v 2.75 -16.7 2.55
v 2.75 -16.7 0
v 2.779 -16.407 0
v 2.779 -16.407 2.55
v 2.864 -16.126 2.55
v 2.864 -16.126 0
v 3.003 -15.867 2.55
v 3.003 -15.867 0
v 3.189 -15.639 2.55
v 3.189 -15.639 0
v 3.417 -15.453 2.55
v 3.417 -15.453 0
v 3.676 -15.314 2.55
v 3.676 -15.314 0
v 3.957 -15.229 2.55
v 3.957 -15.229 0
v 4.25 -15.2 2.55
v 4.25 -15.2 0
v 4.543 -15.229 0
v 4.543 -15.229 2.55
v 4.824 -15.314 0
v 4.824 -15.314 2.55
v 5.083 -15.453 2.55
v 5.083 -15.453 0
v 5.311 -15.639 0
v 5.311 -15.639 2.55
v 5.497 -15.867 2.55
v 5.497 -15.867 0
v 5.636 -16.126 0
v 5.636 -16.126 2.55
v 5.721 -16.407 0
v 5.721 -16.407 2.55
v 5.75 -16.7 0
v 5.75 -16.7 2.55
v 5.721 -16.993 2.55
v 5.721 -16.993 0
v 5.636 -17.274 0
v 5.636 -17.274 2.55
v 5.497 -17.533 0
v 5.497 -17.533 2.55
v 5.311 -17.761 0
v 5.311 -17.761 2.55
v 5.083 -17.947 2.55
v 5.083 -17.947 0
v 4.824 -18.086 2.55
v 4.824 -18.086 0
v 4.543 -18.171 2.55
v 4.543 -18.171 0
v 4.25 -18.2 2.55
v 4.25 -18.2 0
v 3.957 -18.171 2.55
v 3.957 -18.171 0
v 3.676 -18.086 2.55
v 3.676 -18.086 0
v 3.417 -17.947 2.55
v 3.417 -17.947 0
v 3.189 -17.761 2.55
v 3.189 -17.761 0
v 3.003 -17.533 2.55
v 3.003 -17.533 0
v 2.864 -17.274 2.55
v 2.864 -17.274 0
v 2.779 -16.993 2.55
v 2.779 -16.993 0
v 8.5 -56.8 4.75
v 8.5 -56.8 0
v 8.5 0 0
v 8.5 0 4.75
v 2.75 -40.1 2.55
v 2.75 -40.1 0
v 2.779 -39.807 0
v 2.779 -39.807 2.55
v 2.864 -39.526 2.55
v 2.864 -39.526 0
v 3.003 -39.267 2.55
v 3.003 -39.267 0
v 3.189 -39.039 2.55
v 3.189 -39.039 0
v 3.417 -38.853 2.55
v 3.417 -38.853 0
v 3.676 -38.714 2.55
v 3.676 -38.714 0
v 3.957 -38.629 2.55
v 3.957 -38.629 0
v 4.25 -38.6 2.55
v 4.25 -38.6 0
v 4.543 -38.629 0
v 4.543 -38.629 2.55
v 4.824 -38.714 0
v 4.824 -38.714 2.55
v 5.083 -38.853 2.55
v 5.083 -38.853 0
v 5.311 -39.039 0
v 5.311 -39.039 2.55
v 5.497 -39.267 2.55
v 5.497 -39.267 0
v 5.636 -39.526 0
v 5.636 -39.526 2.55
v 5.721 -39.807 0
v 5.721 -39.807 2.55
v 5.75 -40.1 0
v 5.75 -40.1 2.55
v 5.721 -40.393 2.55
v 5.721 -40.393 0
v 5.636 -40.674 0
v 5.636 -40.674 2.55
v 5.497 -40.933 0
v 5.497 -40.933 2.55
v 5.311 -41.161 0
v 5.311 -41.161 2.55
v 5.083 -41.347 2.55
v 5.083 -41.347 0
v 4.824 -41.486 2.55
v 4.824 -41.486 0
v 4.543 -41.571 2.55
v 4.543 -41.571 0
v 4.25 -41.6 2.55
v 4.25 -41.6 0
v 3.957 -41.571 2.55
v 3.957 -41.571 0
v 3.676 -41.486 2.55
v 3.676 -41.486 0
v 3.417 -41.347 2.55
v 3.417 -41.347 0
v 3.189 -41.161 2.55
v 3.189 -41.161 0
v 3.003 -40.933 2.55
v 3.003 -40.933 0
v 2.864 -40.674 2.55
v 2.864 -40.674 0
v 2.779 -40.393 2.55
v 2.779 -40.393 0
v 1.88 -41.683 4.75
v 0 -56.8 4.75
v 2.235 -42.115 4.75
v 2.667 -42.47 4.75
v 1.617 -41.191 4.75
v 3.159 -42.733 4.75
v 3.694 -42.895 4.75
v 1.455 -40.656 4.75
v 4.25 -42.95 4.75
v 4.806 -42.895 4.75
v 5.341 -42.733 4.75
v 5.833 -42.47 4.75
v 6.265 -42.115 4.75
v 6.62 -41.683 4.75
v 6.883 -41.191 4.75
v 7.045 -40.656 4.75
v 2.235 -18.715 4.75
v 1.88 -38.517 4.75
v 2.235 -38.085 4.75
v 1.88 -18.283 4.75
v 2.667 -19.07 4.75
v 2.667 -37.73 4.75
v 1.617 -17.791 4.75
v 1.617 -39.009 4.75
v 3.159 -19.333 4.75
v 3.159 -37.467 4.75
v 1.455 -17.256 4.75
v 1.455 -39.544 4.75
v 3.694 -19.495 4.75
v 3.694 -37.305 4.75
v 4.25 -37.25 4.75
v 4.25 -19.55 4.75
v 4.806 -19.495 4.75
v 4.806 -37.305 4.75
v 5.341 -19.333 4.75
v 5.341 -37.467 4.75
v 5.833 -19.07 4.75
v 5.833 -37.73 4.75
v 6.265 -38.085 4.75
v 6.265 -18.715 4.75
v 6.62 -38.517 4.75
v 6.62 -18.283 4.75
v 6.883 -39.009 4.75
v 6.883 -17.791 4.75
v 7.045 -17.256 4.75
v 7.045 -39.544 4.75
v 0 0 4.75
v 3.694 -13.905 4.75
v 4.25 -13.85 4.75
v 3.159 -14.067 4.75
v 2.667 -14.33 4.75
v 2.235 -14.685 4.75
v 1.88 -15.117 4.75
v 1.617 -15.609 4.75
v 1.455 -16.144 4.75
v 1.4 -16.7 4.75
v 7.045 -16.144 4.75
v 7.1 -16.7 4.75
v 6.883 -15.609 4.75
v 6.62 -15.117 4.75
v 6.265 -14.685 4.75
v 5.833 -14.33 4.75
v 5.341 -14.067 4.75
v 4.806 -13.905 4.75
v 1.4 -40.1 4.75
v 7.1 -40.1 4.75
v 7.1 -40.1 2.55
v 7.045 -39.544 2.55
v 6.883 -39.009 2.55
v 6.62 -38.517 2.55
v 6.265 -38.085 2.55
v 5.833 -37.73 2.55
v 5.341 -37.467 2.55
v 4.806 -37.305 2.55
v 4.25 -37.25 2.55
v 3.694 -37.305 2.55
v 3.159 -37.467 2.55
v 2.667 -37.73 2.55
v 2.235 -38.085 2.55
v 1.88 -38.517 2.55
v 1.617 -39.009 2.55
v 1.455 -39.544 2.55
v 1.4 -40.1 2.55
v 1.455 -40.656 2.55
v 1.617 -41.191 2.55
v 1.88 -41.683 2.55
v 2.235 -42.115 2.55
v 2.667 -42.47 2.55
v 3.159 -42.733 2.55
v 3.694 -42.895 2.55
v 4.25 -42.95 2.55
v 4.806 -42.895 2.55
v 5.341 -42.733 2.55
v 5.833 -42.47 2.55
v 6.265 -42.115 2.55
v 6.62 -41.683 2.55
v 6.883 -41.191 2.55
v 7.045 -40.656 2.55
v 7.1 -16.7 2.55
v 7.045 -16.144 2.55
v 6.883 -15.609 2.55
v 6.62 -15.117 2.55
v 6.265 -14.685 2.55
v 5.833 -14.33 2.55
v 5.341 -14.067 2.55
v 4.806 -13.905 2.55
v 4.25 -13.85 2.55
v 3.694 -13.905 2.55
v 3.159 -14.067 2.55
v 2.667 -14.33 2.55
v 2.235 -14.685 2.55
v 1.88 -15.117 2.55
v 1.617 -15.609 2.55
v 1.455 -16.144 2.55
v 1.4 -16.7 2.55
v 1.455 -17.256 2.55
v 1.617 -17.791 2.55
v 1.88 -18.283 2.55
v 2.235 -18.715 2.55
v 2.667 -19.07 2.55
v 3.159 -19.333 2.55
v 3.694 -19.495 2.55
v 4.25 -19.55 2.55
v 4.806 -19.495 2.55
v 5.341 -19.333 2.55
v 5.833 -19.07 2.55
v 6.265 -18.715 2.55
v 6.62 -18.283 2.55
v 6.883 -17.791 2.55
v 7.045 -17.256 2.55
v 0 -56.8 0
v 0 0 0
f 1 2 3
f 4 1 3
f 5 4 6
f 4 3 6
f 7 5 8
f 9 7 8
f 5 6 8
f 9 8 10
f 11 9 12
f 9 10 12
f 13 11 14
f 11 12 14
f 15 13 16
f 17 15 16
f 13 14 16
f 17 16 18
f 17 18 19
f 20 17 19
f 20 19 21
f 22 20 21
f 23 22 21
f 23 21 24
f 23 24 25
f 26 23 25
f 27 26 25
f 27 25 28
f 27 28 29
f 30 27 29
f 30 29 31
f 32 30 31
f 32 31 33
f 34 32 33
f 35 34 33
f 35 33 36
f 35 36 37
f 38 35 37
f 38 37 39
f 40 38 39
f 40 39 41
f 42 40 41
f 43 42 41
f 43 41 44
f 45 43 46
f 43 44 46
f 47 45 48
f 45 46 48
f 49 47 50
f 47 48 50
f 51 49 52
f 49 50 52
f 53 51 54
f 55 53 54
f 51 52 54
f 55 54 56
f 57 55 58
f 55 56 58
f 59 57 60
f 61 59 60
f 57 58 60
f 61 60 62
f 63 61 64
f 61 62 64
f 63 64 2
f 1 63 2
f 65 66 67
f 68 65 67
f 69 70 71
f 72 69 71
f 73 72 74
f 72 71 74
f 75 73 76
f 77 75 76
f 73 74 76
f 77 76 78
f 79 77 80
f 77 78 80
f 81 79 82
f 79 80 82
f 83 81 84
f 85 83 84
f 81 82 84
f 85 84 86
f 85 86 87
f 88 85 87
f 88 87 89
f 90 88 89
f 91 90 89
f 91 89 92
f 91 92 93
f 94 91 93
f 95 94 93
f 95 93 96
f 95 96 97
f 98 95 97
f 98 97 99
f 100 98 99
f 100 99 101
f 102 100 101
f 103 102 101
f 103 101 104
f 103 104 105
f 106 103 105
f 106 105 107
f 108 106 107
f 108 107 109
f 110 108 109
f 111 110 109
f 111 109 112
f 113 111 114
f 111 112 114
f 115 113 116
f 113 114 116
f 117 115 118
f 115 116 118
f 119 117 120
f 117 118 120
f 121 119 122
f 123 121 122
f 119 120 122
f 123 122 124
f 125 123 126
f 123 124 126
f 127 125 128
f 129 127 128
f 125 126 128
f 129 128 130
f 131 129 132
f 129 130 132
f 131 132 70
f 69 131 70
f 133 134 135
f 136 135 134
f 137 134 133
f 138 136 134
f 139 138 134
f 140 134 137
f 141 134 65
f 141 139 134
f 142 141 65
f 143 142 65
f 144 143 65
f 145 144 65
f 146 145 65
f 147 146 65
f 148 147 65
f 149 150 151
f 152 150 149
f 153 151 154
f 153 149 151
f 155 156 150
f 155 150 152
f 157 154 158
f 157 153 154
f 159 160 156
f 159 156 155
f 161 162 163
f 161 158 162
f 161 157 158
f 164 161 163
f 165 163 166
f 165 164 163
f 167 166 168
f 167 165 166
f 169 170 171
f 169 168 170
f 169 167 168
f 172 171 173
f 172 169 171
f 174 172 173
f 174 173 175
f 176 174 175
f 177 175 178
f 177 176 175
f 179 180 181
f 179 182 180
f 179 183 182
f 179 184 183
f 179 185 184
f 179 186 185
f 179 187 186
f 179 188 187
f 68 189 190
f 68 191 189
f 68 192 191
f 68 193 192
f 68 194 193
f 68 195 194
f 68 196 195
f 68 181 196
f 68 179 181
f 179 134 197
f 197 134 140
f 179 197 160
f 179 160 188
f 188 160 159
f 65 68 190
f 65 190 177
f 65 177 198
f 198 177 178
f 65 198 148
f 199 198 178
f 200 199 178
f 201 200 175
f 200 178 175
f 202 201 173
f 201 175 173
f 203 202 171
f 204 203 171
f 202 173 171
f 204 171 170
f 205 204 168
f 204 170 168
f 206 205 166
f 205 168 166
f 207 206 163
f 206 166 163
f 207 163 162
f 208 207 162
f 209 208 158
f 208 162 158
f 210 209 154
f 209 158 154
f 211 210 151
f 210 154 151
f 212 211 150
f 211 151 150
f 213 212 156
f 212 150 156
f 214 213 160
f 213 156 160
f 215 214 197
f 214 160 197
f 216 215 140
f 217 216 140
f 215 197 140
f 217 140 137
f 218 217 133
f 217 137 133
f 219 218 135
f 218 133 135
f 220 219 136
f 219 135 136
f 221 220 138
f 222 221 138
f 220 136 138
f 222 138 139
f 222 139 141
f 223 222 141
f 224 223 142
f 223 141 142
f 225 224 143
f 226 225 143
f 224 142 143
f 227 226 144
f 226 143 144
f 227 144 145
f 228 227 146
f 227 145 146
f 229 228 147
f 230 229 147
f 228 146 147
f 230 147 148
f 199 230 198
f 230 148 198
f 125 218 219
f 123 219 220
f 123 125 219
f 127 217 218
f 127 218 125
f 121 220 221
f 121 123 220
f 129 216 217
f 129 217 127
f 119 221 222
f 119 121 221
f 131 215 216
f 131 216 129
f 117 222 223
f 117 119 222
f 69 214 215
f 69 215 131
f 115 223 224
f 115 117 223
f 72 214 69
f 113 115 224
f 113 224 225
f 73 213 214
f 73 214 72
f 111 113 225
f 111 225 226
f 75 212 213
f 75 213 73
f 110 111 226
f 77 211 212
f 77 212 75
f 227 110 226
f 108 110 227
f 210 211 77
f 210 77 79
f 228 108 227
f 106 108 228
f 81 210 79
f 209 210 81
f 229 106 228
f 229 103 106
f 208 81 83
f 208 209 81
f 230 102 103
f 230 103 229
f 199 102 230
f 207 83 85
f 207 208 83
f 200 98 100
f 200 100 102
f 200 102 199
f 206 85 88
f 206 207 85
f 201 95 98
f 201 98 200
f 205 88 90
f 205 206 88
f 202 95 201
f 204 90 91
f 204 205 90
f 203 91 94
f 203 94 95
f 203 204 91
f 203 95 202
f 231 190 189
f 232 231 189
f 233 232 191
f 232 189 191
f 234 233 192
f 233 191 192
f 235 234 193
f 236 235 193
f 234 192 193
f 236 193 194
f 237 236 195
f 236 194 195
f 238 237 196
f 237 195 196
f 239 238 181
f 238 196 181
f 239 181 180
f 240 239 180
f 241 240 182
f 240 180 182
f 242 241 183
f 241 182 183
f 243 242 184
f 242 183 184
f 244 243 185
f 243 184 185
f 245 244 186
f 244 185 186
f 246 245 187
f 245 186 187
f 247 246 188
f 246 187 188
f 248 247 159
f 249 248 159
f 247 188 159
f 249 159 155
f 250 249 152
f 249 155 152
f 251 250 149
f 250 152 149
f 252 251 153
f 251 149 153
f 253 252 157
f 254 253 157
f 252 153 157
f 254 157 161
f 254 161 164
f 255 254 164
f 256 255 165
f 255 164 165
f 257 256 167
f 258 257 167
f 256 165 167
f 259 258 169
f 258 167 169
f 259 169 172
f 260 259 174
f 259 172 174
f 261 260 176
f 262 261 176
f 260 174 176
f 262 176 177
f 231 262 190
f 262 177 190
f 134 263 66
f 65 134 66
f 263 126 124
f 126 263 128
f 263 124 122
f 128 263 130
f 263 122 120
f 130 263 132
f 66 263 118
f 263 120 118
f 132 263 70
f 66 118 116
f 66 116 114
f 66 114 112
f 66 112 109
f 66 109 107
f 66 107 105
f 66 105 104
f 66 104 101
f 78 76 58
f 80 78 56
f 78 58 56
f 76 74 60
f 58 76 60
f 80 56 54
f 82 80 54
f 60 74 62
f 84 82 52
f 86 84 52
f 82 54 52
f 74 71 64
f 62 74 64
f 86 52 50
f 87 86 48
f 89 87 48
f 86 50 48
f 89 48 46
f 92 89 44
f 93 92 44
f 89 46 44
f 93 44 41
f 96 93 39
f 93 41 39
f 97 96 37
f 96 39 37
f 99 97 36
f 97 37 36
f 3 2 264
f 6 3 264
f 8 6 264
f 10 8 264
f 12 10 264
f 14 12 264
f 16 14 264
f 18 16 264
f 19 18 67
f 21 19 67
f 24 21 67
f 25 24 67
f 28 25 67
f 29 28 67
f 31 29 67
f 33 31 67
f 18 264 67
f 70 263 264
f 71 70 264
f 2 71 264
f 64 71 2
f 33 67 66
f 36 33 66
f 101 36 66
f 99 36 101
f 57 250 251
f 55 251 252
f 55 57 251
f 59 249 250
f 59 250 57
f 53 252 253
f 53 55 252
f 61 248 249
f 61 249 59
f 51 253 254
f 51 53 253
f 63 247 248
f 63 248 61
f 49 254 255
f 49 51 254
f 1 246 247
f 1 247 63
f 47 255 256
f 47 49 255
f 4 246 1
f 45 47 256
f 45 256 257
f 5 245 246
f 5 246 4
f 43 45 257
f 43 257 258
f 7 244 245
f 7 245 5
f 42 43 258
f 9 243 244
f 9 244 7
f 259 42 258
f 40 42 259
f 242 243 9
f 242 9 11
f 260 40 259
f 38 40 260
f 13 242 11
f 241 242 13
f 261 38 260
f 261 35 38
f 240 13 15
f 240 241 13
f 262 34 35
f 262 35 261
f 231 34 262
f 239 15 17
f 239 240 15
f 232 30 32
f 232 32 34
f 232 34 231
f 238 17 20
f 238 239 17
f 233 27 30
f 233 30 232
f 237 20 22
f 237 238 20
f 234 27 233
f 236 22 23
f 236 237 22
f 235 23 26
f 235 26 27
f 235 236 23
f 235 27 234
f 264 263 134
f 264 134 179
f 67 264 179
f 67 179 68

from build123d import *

# Parameters (mm, degrees)
SKETCH1_W                 = 8.5
SKETCH1_H                 = 56.8
BOSS_EXTRUDE1_DEPTH       = 4.75
F_3_0MM_DOWEL_HOLE1_D     = 3
F_3_0MM_DOWEL_HOLE1_DEPTH = 5
F_3_0MM_DOWEL_HOLE1_TIP   = 0.901290929
SKETCH6_R                 = 2.85
CUT_EXTRUDE1_DEPTH        = 2.2


with BuildPart() as part:
    # Sketch1 → Boss-Extrude1 (new body)
    with BuildSketch(Plane.XY):
        with Locations((4.25, -28.4)):
            Rectangle(SKETCH1_W, SKETCH1_H)
    extrude(amount=BOSS_EXTRUDE1_DEPTH)

    # Ø3.0mm Dowel Hole1
    with Locations(Plane.XY.offset(4.75)):
        with Locations((4.25, -16.7), (4.25, -40.1)):
            Hole(F_3_0MM_DOWEL_HOLE1_D / 2, depth=F_3_0MM_DOWEL_HOLE1_DEPTH)
            with Locations((0, 0, -(F_3_0MM_DOWEL_HOLE1_DEPTH + F_3_0MM_DOWEL_HOLE1_TIP / 2))):  # 118° drill point
                Cone(0, F_3_0MM_DOWEL_HOLE1_D / 2, F_3_0MM_DOWEL_HOLE1_TIP, mode=Mode.SUBTRACT)

    # Sketch6 → Cut-Extrude1 (cut)
    with BuildSketch(Plane.XY.offset(4.75)):
        with Locations((4.25, -16.7)):
            Circle(SKETCH6_R)
        with Locations((4.25, -40.1)):
            Circle(SKETCH6_R)
    extrude(amount=-CUT_EXTRUDE1_DEPTH, mode=Mode.SUBTRACT)


solid = part.part
